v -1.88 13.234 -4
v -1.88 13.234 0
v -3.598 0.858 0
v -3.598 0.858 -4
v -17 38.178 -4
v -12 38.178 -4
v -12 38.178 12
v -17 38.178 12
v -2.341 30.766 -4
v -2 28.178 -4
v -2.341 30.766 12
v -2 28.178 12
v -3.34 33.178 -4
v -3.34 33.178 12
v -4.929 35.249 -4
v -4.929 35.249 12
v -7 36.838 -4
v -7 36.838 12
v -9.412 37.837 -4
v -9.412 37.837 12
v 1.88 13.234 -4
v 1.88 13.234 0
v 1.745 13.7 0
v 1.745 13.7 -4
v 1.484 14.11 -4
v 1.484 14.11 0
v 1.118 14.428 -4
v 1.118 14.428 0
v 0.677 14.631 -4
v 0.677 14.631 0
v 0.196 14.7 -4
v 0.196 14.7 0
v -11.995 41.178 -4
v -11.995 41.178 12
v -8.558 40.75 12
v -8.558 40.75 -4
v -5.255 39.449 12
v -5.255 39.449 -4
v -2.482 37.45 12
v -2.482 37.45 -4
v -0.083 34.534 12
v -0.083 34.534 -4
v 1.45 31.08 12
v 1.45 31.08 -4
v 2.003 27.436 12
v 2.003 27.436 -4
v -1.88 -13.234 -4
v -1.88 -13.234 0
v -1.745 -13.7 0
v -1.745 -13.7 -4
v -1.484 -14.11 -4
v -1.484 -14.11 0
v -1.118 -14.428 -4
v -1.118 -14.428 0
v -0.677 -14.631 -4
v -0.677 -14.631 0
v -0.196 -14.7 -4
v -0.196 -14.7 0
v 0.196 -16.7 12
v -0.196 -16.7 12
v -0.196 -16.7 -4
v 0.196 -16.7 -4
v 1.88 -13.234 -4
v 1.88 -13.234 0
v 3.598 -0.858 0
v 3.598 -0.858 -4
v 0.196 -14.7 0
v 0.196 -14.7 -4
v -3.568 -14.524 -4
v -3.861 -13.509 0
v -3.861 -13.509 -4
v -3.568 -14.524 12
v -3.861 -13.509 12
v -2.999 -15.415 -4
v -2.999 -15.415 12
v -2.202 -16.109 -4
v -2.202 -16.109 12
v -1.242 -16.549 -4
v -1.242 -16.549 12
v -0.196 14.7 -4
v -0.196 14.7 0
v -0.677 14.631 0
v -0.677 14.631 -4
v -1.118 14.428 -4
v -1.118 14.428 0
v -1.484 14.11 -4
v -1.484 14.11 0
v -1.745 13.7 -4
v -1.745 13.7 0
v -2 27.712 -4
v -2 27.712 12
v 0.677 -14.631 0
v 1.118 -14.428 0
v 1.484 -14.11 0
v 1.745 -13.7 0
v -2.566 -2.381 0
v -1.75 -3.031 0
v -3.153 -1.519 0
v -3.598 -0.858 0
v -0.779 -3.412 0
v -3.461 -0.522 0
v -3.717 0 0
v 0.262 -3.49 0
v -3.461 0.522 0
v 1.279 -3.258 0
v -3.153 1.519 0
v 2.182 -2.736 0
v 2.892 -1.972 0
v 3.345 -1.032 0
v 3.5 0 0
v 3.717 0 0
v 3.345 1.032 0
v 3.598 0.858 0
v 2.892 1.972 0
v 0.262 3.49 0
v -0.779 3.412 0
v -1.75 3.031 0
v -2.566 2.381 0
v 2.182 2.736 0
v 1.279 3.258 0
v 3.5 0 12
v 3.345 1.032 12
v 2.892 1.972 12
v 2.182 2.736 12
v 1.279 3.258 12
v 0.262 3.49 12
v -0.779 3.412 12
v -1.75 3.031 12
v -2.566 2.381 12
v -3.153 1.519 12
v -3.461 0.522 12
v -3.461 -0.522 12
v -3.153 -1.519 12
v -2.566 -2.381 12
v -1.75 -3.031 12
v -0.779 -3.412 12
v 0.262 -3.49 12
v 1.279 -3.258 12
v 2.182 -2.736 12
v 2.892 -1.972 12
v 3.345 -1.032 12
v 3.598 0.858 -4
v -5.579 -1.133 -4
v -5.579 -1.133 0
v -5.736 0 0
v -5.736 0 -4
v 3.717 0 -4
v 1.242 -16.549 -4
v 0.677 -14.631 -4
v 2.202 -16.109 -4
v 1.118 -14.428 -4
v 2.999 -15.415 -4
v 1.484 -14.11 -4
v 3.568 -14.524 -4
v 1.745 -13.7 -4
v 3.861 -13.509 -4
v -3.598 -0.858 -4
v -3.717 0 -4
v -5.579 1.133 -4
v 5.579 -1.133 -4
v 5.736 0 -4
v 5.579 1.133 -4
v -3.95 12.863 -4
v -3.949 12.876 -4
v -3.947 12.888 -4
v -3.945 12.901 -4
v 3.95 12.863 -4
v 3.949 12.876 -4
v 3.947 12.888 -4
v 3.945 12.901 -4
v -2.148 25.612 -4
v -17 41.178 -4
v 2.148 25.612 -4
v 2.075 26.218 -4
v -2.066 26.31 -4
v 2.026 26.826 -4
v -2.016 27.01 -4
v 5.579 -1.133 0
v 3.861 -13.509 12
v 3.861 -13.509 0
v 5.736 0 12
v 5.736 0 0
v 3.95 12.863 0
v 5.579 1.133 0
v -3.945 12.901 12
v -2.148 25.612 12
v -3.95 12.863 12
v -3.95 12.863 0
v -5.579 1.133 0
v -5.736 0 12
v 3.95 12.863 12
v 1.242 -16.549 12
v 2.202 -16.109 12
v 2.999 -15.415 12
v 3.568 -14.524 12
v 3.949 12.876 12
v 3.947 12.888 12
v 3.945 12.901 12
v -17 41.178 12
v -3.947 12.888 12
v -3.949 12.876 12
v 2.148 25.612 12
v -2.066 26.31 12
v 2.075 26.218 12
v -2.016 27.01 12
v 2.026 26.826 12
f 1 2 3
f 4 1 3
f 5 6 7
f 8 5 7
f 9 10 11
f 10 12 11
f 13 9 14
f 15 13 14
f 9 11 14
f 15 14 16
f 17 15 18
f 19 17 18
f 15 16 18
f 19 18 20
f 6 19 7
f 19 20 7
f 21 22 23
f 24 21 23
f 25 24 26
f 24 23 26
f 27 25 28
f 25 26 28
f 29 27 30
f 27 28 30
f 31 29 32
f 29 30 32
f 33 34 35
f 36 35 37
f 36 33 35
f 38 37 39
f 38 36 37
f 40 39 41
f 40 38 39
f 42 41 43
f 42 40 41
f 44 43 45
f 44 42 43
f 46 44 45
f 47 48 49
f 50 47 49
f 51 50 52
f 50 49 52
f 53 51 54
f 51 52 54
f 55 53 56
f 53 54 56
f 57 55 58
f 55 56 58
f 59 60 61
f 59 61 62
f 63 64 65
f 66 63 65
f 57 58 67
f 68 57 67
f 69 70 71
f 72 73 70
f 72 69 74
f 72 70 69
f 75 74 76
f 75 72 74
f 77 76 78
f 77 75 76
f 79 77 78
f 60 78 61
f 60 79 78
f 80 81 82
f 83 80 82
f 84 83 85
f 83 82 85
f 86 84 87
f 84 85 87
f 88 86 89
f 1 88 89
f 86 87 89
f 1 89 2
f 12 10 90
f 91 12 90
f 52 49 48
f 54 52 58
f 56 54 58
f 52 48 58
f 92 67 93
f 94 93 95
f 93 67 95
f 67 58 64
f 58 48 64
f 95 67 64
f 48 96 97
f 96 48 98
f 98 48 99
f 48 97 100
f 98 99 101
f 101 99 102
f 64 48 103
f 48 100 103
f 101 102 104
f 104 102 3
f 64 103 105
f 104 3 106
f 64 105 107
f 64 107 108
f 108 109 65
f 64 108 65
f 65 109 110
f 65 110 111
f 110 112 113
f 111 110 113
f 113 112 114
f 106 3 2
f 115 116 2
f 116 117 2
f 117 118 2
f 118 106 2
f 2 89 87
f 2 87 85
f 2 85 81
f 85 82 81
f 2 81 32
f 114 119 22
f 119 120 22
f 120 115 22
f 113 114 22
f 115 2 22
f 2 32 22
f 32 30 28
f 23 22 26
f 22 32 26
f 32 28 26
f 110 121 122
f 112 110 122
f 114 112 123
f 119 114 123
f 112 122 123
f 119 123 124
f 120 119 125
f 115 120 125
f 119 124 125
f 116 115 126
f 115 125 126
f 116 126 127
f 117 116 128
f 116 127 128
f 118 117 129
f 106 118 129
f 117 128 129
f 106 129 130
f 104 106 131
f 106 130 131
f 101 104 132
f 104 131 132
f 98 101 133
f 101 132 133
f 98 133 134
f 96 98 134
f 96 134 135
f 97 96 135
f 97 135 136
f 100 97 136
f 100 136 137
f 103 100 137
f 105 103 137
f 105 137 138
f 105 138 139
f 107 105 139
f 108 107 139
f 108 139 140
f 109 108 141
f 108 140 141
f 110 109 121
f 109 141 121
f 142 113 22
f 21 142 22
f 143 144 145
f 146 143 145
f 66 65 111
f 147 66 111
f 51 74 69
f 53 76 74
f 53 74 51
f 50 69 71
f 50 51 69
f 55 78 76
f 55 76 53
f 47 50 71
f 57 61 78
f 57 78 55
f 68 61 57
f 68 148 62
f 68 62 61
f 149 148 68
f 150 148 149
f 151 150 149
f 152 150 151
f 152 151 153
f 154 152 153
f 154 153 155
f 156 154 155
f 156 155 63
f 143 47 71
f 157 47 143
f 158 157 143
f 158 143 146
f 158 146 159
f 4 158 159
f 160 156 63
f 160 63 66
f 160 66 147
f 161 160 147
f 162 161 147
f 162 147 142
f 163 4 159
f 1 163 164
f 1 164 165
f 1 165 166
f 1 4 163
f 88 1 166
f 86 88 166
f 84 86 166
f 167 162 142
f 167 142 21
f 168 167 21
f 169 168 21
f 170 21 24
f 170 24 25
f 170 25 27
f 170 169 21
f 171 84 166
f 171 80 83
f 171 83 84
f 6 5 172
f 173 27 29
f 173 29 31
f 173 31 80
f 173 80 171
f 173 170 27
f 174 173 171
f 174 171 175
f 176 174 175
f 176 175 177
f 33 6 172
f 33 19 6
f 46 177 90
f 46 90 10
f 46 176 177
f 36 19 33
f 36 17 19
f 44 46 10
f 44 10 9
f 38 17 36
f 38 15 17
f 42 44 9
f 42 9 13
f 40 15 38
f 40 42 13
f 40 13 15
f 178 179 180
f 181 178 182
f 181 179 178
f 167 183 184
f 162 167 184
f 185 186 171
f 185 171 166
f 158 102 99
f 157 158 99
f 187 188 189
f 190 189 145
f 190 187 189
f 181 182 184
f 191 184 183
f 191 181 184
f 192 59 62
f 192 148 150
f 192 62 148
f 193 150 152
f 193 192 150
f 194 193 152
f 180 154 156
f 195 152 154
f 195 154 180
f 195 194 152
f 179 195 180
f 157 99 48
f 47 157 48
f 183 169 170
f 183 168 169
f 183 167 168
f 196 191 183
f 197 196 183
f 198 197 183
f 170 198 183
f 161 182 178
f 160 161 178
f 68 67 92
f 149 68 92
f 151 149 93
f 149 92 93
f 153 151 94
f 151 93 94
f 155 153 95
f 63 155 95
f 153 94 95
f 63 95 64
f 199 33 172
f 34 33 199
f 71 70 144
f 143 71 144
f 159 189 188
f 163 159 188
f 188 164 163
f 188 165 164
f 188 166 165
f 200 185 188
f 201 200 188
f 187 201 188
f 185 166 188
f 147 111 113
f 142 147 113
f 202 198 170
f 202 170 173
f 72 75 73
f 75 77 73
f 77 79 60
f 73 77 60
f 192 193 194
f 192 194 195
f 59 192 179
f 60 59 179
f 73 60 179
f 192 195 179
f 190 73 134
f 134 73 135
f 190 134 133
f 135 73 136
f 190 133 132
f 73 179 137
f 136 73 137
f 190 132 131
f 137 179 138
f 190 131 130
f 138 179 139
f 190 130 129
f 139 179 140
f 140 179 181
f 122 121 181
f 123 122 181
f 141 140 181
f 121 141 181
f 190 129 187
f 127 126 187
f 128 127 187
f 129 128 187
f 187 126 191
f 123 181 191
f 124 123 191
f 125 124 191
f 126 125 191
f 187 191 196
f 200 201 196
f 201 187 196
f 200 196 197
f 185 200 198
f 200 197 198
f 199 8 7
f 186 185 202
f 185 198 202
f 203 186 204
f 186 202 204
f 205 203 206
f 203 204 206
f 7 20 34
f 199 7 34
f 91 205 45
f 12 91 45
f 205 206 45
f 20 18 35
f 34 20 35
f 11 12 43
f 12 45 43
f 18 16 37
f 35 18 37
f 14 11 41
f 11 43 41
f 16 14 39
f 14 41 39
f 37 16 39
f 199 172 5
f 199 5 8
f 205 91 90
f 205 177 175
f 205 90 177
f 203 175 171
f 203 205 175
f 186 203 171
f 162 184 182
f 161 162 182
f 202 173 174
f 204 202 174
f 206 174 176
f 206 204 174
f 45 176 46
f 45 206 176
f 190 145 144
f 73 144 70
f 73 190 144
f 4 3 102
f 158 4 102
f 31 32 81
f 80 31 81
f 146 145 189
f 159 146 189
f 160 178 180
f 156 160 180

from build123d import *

# Parameters (mm, degrees)
BOSS_EXTRUDE1_DEPTH = 4
BOSS_EXTRUDE2_START = 12
SKETCH3_R           = 3.5
BOSS_EXTRUDE2_DEPTH = 12
SKETCH4_W           = 16
SKETCH4_H           = 3
BOSS_EXTRUDE3_DEPTH = 15
FILLET3_R           = 10
FILLET5_R           = 14


with BuildPart() as part:
    # Sketch2 → Boss-Extrude1 (new body)
    with BuildSketch(Plane.XY):
        with BuildLine():
            Line((-2, 41.178043508), (2, 41.178043508))
            Line((2, 41.178043508), (2, 27.712303128))
            ThreePointArc((2, 27.712303128), (2.036985125, 26.659599059), (2.147758114, 25.612086241))
            Line((2.147758114, 25.612086241), (3.94525946, 12.900577758))
            ThreePointArc((3.94525946, 12.900577758), (3.94789108, 12.8818827), (3.950499168, 12.863184344))
            Line((3.950499168, 12.863184344), (5.5790973, 1.133209829))
            Line((5.5790973, 1.133209829), (5.736432971, 0))
            Line((5.736432971, 0), (5.5790973, -1.133209829))
            Line((5.5790973, -1.133209829), (3.860857289, -13.50882979))
            ThreePointArc((3.860857289, -13.50882979), (2.625757677, -15.790400529), (0.196011829, -16.7))
            Line((0.196011829, -16.7), (-0.196011829, -16.7))
            ThreePointArc((-0.196011829, -16.7), (-2.625757677, -15.790400529), (-3.860857289, -13.50882979))
            Line((-3.860857289, -13.50882979), (-5.5790973, -1.133209829))
            Line((-5.5790973, -1.133209829), (-5.736432971, 0))
            Line((-5.736432971, 0), (-5.5790973, 1.133209829))
            Line((-5.5790973, 1.133209829), (-3.950499168, 12.863184344))
            ThreePointArc((-3.950499168, 12.863184344), (-3.94789108, 12.8818827), (-3.94525946, 12.900577758))
            Line((-3.94525946, 12.900577758), (-2.147758114, 25.612086241))
            ThreePointArc((-2.147758114, 25.612086241), (-2.036985125, 26.659599059), (-2, 27.712303128))
            Line((-2, 27.712303128), (-2, 41.178043508))
        make_face()
        with BuildLine():
            Line((-3.598099755, -0.858166699), (-1.879859743, -13.23378666))
            ThreePointArc((-1.879859743, -13.23378666), (-1.312381543, -14.282075919), (-0.196011829, -14.7))
            Line((-0.196011829, -14.7), (0.196011829, -14.7))
            ThreePointArc((0.196011829, -14.7), (1.312381543, -14.282075919), (1.879859743, -13.23378666))
            Line((1.879859743, -13.23378666), (3.598099755, -0.858166699))
            Line((3.598099755, -0.858166699), (3.717248239, 0))
            Line((3.717248239, 0), (3.598099755, 0.858166699))
            Line((3.598099755, 0.858166699), (1.879859743, 13.23378666))
            ThreePointArc((1.879859743, 13.23378666), (1.312381543, 14.282075919), (0.196011829, 14.7))
            Line((0.196011829, 14.7), (-0.196011829, 14.7))
            ThreePointArc((-0.196011829, 14.7), (-1.312381543, 14.282075919), (-1.879859743, 13.23378666))
            Line((-1.879859743, 13.23378666), (-3.598099755, 0.858166699))
            Line((-3.598099755, 0.858166699), (-3.717248239, 0))
            Line((-3.717248239, 0), (-3.598099755, -0.858166699))
        make_face(mode=Mode.SUBTRACT)
    extrude(amount=-BOSS_EXTRUDE1_DEPTH)

    # Sketch3 → Boss-Extrude2 (add)
    with BuildSketch(Plane.XY.offset(BOSS_EXTRUDE2_START)):
        with BuildLine():
            Line((-3.950499168, 12.863184344), (-5.736432971, 0))
            Line((-5.736432971, 0), (-3.860857289, -13.50882979))
            ThreePointArc((-3.860857289, -13.50882979), (-2.625757677, -15.790400529), (-0.196011829, -16.7))
            Line((-0.196011829, -16.7), (0.196011829, -16.7))
            ThreePointArc((0.196011829, -16.7), (2.625757677, -15.790400529), (3.860857289, -13.50882979))
            Line((3.860857289, -13.50882979), (5.736432971, 0))
            Line((5.736432971, 0), (3.950499168, 12.863184344))
            ThreePointArc((3.950499168, 12.863184344), (3.94789108, 12.8818827), (3.94525946, 12.900577758))
            Line((3.94525946, 12.900577758), (2.147758114, 25.612086241))
            ThreePointArc((2.147758114, 25.612086241), (2.036985125, 26.659599059), (2, 27.712303128))
            Line((2, 27.712303128), (2, 41.178043508))
            Line((2, 41.178043508), (-2, 41.178043508))
            Line((-2, 41.178043508), (-2, 27.712303128))
            ThreePointArc((-2, 27.712303128), (-2.036985125, 26.659599059), (-2.147758114, 25.612086241))
            Line((-2.147758114, 25.612086241), (-3.94525946, 12.900577758))
            ThreePointArc((-3.94525946, 12.900577758), (-3.94789108, 12.8818827), (-3.950499168, 12.863184344))
        make_face()
        Circle(SKETCH3_R, mode=Mode.SUBTRACT)
    extrude(amount=-BOSS_EXTRUDE2_DEPTH)

    # Sketch4 → Boss-Extrude3 (add)
    with BuildSketch(Plane.ZY.offset(2)):
        with Locations((4, 39.678043508)):
            Rectangle(SKETCH4_W, SKETCH4_H)
    extrude(amount=BOSS_EXTRUDE3_DEPTH)

    # Fillet3
    fillet3_edges = [part.edges().sort_by_distance(p)[0] for p in [
        (-2, 38.178043508, 4),
    ]]
    fillet(fillet3_edges, radius=FILLET3_R)

    # Fillet5
    fillet5_edges = [part.edges().sort_by_distance(p)[0] for p in [
        (2, 41.178043508, 4),
    ]]
    fillet(fillet5_edges, radius=FILLET5_R)


solid = part.part
